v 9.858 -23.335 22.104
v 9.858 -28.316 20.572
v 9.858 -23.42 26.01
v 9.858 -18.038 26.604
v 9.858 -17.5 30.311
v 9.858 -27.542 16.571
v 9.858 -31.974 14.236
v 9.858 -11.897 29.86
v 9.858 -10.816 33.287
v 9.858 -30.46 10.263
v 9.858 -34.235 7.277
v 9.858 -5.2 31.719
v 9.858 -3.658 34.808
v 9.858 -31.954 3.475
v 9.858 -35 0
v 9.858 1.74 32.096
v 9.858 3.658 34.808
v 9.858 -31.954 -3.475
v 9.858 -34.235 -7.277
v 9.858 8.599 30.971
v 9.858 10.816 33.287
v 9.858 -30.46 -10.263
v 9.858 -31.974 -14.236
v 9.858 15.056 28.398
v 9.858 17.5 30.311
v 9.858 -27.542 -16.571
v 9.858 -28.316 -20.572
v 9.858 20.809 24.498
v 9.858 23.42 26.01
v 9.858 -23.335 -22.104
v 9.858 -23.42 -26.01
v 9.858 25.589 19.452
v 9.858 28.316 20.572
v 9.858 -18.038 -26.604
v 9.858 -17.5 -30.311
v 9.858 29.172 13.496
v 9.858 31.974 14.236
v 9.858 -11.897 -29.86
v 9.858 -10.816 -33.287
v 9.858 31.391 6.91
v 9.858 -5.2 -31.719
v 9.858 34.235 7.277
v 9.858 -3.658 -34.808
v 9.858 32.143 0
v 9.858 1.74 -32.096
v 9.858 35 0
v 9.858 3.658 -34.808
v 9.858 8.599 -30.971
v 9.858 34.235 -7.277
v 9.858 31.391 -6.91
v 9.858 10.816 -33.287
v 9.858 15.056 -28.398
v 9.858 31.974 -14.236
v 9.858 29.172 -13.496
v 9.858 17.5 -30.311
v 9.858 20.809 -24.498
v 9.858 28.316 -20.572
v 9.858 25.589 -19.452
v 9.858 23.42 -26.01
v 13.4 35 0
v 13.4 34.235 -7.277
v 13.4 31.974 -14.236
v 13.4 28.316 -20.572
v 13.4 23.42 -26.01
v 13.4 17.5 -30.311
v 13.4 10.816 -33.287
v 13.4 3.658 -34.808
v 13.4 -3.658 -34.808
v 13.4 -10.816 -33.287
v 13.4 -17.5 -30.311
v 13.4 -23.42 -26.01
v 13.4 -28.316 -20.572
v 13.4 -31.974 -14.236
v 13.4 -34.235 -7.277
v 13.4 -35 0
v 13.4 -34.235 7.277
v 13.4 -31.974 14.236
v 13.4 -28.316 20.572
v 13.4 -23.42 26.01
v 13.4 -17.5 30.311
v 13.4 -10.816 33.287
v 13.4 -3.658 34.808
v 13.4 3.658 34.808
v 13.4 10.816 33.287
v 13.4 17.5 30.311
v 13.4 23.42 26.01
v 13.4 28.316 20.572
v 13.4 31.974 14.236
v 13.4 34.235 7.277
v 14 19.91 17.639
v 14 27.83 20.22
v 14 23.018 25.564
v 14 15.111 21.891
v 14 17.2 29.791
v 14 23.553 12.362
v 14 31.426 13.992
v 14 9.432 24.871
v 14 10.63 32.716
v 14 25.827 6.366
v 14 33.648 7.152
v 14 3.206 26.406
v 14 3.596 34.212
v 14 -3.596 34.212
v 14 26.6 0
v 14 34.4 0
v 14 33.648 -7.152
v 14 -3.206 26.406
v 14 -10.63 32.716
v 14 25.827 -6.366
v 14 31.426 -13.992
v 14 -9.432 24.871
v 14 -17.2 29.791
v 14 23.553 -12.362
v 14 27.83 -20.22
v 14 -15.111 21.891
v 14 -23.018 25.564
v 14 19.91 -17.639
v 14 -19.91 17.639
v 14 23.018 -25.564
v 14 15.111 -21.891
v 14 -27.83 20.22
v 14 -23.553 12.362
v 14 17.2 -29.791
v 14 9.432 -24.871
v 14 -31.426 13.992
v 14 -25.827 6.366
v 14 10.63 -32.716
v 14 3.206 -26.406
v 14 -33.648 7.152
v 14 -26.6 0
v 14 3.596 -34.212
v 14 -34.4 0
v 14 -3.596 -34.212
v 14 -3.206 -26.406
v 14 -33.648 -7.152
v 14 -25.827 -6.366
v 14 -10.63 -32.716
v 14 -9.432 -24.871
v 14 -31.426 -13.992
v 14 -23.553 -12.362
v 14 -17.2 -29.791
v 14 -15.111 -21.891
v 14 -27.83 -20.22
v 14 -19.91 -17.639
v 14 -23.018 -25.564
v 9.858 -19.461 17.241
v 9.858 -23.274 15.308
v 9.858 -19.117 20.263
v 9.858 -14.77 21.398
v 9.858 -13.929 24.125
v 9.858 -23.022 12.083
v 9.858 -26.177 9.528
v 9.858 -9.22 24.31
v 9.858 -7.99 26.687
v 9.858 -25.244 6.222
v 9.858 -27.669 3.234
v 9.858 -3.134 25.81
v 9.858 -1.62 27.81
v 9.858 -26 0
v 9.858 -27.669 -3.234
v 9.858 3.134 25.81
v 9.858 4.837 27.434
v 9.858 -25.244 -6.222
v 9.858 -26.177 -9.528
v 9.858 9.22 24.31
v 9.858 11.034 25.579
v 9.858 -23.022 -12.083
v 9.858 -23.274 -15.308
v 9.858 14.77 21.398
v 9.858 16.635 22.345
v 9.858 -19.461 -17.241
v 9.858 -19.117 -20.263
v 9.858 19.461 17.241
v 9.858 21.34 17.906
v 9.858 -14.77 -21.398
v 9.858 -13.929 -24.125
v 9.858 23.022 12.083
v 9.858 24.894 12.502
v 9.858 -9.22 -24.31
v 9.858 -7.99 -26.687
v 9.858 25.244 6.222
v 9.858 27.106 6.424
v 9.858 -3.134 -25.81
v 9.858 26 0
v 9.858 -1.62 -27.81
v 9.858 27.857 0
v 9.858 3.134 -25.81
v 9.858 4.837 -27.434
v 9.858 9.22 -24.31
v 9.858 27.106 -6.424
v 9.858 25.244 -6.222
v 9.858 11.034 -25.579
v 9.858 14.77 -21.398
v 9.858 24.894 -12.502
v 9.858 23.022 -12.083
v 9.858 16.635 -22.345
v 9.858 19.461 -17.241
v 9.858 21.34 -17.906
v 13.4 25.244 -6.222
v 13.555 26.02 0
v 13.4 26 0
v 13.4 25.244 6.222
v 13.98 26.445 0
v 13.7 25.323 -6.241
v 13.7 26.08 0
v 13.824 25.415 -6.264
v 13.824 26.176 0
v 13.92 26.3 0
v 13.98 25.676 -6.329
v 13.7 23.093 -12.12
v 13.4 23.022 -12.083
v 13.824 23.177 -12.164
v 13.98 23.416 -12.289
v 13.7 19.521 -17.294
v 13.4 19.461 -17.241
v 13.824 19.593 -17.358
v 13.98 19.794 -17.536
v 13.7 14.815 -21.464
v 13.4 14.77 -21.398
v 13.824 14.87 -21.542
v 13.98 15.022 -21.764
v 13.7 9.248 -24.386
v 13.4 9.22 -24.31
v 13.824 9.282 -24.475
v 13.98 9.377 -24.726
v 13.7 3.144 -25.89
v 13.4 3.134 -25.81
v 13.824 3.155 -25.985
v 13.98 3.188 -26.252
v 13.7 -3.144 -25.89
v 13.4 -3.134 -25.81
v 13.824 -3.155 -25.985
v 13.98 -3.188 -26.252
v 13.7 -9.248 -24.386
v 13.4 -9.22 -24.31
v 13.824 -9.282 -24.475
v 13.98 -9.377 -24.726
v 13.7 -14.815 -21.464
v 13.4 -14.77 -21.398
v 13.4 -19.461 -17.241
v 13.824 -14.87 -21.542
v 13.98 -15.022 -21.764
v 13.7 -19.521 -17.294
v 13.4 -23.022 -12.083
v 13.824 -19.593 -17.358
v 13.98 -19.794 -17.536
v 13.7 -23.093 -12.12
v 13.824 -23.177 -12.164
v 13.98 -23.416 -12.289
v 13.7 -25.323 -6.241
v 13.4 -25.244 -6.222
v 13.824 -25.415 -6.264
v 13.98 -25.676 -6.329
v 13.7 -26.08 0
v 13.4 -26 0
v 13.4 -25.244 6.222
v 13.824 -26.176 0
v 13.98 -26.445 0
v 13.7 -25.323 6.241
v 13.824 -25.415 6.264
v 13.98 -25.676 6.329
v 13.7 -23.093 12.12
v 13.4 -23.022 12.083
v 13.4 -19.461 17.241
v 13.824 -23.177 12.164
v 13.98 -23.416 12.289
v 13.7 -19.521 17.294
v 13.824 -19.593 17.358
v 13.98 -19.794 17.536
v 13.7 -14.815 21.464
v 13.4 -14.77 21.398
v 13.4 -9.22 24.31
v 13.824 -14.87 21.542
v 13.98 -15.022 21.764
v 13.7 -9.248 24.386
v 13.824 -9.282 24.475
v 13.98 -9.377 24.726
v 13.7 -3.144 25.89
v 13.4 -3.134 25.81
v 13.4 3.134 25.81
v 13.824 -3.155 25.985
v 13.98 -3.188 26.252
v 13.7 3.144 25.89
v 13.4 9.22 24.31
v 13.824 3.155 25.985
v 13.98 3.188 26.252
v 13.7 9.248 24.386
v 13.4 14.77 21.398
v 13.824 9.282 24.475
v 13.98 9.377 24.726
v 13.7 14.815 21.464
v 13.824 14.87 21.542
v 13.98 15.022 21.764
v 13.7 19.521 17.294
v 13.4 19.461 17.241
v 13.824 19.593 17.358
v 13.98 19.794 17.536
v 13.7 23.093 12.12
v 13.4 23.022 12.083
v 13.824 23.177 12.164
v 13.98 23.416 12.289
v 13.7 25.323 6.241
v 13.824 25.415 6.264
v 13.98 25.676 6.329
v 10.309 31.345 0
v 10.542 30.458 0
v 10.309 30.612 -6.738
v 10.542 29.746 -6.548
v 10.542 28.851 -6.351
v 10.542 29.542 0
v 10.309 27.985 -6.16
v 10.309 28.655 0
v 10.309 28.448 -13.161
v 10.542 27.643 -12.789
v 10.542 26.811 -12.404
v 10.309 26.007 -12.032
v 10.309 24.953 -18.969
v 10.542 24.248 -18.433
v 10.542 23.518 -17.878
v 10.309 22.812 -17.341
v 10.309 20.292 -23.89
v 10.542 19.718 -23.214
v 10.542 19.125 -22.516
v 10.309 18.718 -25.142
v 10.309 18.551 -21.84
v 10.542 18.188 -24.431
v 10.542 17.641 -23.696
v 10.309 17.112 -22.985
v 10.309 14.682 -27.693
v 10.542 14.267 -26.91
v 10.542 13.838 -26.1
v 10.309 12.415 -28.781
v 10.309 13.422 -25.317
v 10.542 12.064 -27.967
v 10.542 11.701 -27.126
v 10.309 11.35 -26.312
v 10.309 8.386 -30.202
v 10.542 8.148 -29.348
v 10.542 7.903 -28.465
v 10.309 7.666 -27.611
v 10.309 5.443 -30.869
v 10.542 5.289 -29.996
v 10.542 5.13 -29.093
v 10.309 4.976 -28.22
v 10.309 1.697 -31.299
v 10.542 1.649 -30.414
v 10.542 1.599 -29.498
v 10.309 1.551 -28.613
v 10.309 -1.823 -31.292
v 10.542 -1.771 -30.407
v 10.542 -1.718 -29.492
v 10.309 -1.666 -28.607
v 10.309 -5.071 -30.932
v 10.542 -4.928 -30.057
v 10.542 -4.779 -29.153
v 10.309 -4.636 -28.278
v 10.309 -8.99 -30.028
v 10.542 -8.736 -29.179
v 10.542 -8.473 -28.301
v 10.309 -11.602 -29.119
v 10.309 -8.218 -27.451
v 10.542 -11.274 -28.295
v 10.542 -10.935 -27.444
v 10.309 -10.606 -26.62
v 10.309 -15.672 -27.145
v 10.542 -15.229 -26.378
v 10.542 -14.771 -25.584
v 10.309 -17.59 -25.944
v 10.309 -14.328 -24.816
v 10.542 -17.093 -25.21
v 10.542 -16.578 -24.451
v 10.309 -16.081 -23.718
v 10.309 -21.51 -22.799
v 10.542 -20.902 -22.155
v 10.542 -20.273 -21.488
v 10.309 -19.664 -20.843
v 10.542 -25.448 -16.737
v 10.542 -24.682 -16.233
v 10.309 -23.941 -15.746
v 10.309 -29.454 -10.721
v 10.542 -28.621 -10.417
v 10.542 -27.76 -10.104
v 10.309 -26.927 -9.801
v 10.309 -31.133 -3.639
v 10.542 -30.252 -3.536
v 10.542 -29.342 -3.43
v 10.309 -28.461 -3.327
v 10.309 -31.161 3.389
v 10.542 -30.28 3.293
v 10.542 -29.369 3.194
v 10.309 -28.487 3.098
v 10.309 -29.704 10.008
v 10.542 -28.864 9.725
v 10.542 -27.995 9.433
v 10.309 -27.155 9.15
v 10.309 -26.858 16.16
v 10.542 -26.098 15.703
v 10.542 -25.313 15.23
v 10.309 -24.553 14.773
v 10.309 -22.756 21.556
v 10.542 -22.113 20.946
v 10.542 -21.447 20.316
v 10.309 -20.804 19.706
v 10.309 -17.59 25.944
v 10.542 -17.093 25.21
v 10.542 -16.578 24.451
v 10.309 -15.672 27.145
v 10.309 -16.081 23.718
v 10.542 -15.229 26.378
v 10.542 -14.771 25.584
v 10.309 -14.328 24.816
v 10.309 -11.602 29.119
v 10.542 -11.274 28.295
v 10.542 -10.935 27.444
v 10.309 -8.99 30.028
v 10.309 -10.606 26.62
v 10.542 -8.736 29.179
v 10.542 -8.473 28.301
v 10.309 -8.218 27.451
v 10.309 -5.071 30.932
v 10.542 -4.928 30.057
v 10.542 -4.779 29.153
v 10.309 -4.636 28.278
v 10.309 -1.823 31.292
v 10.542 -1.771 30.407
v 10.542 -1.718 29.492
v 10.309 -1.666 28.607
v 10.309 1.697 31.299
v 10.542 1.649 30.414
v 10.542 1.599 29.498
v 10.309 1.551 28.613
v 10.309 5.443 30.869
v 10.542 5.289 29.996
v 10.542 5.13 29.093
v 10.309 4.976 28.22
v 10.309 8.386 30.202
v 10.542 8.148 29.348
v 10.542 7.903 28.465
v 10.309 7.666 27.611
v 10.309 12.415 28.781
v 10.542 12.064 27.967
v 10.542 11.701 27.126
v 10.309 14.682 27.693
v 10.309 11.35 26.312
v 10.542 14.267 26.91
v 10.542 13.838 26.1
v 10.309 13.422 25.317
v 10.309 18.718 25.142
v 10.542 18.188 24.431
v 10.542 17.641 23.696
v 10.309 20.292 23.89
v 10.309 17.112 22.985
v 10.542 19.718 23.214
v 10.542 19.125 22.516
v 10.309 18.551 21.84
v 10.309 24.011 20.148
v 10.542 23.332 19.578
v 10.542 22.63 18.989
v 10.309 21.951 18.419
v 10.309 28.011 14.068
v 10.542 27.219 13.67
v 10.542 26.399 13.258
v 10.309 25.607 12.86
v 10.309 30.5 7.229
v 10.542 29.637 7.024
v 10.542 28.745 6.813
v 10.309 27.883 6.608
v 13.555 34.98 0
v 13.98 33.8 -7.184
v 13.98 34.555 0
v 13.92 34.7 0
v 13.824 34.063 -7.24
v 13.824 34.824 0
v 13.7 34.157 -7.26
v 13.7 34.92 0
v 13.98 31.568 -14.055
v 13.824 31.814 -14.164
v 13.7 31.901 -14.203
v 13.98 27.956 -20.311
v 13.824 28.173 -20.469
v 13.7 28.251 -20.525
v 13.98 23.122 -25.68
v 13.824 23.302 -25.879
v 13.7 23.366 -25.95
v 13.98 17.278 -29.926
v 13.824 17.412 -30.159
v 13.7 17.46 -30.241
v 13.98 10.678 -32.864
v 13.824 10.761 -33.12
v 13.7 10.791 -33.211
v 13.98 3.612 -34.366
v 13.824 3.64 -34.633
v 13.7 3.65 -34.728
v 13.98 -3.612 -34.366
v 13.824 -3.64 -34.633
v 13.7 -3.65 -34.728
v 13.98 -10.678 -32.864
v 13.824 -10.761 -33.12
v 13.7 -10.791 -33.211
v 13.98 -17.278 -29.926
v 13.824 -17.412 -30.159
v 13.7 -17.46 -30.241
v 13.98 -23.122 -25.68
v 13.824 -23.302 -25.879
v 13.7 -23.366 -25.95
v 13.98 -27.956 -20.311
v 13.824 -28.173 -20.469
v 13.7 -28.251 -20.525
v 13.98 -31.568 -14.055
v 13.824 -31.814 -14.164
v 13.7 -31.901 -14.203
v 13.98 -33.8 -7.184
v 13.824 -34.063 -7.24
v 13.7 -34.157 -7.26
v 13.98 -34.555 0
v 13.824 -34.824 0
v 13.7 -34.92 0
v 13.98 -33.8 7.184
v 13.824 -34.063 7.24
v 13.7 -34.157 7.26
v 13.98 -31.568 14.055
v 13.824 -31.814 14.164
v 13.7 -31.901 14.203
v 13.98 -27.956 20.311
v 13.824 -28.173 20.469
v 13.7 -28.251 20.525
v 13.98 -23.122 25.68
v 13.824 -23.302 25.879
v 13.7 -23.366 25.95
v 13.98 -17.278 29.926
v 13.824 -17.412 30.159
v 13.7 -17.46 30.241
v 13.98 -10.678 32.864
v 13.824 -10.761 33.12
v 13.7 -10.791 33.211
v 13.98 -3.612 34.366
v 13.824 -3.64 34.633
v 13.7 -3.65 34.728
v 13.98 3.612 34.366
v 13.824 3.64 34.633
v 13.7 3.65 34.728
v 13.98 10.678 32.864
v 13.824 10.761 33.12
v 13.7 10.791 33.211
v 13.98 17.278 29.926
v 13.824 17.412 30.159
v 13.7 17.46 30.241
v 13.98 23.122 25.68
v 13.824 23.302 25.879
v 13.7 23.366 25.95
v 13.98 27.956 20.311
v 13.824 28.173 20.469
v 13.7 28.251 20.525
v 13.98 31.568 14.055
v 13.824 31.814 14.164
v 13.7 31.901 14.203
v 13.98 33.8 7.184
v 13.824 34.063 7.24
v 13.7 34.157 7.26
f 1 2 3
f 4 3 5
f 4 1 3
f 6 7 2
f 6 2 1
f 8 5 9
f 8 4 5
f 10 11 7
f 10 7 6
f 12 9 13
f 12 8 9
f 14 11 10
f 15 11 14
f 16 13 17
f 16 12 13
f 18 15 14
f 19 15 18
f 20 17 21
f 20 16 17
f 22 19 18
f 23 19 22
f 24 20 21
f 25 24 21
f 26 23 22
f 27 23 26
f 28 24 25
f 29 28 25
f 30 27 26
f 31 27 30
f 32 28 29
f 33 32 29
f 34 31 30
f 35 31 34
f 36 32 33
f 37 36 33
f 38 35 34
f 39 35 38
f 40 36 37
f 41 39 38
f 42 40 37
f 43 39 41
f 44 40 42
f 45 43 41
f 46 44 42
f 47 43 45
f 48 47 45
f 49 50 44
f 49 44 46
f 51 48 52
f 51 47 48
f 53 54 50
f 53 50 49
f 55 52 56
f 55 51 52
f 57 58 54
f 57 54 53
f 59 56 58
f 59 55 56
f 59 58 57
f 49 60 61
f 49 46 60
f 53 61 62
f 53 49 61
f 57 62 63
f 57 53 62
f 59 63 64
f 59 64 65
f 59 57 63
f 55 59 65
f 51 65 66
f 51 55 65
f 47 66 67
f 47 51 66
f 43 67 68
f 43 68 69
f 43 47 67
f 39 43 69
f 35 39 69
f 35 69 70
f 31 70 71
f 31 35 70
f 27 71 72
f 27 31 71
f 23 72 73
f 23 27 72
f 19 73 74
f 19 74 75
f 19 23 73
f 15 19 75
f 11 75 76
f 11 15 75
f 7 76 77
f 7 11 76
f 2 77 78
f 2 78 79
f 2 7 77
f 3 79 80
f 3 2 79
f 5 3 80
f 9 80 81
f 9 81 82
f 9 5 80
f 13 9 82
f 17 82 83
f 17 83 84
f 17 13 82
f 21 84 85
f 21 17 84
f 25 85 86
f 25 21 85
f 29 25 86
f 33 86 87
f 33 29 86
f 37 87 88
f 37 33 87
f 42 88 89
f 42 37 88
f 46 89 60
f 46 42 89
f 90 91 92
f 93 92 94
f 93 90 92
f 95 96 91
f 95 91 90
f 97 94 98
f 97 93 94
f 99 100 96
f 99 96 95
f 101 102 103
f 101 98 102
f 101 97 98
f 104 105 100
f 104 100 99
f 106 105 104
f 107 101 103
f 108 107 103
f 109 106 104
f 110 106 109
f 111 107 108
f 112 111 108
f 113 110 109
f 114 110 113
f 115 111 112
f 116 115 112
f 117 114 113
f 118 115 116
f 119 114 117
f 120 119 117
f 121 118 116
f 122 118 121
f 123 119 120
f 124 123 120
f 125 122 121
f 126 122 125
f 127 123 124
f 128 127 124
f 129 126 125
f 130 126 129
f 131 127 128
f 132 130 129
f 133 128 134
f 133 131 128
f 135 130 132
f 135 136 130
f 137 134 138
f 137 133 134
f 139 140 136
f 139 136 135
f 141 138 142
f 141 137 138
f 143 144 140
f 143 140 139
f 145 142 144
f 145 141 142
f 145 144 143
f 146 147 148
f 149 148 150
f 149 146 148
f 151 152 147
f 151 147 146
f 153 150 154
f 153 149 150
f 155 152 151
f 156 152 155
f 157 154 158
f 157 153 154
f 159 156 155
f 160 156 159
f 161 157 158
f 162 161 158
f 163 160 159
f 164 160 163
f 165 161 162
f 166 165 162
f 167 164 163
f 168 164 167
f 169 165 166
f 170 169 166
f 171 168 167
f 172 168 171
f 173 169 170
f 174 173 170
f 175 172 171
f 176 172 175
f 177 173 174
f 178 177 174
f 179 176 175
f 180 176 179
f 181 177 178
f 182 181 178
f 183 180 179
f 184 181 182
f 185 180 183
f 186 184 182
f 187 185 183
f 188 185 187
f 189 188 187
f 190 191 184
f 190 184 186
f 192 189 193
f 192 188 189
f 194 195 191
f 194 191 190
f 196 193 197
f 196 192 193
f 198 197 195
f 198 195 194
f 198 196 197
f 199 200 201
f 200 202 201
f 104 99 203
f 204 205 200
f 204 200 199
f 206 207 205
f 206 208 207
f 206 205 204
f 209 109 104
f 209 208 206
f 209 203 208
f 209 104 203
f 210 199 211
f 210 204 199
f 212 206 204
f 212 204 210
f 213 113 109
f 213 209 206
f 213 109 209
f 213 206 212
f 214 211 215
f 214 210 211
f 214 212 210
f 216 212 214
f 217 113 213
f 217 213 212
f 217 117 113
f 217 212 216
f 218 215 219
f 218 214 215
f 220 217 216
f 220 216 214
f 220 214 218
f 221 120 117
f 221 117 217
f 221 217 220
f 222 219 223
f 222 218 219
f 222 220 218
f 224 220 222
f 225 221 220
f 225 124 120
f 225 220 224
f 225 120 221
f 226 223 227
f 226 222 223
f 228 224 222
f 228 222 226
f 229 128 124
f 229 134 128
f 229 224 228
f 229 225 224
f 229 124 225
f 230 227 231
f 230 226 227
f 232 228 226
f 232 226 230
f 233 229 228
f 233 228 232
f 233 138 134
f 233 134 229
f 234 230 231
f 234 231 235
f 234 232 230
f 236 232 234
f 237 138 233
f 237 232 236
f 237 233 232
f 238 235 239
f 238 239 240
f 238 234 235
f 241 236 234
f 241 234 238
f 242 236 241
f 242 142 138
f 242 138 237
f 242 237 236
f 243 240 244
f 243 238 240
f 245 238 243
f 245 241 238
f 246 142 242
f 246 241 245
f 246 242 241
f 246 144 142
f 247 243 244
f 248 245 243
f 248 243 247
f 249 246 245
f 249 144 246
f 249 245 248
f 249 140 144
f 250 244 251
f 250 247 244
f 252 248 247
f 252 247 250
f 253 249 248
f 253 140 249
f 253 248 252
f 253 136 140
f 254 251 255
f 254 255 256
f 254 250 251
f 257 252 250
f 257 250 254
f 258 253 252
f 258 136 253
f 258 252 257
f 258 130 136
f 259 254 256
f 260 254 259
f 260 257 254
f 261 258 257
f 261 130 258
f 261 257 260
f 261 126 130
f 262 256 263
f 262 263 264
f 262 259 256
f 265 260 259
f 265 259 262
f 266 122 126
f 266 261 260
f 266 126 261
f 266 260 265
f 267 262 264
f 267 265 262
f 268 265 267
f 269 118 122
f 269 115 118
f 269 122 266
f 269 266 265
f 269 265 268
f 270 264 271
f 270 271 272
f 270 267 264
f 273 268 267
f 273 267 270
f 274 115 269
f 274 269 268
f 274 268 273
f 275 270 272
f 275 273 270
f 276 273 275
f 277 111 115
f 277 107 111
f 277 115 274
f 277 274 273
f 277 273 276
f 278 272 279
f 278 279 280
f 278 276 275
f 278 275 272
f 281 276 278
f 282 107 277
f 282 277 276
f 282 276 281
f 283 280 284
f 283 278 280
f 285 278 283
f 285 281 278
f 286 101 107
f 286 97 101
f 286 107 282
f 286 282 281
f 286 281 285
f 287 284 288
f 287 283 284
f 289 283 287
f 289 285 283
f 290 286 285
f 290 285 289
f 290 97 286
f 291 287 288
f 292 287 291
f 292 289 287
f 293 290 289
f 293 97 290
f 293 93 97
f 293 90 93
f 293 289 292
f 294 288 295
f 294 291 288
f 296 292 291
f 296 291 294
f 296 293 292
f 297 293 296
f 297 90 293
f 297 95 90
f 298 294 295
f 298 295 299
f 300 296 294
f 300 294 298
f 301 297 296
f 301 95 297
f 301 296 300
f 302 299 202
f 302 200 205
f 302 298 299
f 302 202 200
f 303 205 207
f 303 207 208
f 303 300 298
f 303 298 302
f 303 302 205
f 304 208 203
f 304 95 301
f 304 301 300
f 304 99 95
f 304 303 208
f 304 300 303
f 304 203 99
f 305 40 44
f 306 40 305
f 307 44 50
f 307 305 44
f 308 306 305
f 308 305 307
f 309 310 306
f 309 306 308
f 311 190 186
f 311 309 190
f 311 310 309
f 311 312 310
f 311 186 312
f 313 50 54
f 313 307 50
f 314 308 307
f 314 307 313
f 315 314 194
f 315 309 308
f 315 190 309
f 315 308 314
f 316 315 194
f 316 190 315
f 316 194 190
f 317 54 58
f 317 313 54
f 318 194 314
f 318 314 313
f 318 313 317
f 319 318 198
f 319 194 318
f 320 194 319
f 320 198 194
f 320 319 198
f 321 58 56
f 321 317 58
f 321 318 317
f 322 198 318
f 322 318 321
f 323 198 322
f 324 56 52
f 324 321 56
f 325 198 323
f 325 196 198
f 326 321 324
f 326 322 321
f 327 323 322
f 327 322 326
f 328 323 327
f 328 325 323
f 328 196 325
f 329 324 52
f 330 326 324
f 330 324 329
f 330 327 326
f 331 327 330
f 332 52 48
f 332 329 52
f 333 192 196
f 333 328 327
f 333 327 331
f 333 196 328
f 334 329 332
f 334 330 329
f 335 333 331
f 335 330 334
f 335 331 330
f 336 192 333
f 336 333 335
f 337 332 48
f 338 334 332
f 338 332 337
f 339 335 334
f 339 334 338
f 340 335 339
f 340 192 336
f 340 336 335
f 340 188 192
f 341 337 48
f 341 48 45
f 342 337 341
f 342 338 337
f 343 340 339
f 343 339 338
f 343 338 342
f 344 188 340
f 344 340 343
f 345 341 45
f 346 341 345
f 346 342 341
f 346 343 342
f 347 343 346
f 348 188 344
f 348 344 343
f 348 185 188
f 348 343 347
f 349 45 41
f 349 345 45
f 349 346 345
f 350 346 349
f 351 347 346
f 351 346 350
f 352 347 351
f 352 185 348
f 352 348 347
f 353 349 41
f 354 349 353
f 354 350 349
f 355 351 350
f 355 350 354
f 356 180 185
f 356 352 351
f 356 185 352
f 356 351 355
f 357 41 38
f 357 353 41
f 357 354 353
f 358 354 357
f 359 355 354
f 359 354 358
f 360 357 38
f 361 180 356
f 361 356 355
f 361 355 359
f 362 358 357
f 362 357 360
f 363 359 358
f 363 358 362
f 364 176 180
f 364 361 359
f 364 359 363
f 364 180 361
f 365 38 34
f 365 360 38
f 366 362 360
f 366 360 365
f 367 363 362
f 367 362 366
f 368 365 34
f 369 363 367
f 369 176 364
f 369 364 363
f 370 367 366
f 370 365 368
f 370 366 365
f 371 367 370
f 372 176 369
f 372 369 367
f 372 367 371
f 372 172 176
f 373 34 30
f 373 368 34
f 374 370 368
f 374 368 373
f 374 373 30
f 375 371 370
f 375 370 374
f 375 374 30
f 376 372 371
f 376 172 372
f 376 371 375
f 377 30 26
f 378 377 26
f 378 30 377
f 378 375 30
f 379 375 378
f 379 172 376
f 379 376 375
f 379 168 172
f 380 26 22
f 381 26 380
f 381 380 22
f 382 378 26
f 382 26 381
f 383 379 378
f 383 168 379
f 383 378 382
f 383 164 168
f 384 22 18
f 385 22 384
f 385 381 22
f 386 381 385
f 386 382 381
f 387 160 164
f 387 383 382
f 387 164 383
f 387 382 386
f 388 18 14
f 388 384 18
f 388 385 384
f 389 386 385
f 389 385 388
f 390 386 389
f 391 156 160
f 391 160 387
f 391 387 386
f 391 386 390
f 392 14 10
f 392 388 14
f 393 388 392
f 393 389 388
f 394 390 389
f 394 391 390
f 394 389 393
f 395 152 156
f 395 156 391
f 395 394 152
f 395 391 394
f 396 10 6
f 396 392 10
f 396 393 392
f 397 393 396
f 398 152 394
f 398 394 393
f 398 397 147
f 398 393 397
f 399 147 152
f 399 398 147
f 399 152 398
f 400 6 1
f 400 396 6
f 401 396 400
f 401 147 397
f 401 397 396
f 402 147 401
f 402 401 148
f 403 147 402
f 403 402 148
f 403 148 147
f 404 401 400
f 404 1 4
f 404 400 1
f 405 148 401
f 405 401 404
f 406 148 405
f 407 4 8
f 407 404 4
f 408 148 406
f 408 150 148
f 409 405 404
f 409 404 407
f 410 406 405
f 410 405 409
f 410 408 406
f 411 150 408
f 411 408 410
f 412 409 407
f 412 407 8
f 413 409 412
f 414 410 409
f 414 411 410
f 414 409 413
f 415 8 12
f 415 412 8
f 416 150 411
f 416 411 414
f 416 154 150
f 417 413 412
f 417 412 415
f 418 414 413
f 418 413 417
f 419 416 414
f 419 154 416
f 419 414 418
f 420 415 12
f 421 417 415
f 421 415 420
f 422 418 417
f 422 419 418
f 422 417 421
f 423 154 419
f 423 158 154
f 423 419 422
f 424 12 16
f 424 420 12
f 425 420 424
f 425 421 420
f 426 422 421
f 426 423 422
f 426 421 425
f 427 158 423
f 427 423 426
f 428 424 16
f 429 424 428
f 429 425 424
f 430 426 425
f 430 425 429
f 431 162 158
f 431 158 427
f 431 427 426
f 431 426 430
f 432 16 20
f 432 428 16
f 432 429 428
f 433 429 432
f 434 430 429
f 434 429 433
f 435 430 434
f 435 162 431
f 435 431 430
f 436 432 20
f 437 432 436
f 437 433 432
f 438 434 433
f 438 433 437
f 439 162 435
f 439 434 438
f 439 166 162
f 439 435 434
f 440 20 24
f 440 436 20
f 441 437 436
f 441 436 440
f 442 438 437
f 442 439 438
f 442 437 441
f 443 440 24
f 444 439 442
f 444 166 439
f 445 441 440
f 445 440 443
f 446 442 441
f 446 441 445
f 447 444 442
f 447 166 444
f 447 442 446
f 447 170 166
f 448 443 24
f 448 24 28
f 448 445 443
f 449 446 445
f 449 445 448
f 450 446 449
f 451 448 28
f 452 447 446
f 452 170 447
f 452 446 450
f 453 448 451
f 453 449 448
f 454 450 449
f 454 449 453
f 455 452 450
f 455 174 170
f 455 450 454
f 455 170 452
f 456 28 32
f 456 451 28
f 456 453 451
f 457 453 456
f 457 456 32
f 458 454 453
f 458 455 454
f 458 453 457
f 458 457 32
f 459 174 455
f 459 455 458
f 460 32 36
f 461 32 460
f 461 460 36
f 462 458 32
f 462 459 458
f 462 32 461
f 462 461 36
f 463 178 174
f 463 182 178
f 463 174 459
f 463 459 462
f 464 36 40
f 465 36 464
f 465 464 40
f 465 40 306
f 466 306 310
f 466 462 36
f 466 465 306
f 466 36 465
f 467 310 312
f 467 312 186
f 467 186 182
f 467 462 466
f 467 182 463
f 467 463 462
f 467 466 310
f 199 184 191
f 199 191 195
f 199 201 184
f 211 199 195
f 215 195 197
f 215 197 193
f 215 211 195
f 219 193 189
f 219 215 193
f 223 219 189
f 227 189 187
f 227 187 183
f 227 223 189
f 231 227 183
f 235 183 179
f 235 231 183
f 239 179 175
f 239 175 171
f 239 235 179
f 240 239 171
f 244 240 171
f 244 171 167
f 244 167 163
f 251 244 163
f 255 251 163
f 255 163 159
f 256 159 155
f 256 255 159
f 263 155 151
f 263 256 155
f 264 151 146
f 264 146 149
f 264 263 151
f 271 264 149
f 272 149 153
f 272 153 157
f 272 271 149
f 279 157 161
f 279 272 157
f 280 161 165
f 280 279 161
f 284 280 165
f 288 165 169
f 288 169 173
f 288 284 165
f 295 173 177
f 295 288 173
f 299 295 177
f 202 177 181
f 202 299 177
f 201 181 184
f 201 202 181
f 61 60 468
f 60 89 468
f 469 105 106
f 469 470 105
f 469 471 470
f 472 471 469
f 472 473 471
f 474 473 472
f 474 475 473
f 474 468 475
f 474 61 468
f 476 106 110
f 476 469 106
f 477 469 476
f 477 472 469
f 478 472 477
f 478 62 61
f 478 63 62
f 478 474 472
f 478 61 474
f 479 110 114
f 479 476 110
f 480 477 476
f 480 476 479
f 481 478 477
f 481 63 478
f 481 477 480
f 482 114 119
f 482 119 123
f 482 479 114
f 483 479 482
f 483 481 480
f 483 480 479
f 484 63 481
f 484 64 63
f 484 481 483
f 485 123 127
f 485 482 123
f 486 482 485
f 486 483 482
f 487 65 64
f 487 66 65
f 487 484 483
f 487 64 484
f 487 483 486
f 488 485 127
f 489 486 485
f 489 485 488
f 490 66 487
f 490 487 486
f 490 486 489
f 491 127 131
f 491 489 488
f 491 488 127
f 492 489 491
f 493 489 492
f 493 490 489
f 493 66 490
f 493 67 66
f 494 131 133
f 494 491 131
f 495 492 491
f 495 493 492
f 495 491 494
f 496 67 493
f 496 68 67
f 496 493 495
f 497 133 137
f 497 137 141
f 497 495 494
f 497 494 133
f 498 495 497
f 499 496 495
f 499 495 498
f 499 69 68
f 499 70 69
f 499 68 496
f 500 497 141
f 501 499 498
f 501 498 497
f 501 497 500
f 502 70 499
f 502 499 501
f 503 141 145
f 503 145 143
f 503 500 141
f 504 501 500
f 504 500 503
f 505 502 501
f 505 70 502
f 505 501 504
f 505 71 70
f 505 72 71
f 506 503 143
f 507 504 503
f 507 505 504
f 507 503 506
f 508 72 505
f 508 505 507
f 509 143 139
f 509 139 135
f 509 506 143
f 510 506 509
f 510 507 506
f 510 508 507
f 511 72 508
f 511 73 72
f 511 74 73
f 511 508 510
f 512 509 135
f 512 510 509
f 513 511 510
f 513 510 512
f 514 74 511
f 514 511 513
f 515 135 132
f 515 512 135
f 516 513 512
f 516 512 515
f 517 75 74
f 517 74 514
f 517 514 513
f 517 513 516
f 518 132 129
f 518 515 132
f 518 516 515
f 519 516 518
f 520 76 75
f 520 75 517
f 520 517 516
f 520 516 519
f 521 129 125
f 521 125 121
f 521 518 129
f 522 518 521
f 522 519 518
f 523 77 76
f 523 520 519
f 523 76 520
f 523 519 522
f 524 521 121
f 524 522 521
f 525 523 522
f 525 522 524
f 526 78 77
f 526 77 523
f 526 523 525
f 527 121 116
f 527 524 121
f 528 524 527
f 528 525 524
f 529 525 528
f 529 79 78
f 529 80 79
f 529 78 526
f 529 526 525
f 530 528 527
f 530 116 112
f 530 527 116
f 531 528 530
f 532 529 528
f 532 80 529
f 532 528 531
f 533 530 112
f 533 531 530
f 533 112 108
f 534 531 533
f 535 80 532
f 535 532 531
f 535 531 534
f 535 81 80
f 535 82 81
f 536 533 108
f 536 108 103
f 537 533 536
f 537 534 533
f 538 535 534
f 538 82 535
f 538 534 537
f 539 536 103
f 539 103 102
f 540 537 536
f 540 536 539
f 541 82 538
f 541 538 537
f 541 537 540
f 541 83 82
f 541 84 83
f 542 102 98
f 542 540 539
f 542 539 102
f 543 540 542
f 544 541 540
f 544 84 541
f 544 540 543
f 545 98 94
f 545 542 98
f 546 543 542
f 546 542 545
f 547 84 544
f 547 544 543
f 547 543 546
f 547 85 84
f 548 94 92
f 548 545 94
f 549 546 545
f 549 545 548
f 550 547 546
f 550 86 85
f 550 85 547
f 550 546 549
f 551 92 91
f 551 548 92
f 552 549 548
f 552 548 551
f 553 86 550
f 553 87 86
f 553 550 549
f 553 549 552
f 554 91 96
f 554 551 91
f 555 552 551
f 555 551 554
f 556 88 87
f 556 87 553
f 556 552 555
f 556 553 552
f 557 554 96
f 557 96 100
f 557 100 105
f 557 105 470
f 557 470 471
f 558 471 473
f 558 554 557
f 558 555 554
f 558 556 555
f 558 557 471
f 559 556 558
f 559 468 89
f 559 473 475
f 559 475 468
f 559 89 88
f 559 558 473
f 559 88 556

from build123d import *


with BuildPart() as part:
    # Croquis1 → Revolución1 (revolve)
    with BuildSketch(Plane.XY):
        with BuildLine():
            Line((9.858, 26), (13.4, 26))
            ThreePointArc((13.4, 26), (13.824264069, 26.175735931), (14, 26.6))
            Line((14, 26.6), (14, 34.4))
            ThreePointArc((14, 34.4), (13.824264069, 34.824264069), (13.4, 35))
            Line((13.4, 35), (9.858, 35))
            Line((9.858, 35), (9.858, 32.142666563))
            ThreePointArc((9.858, 32.142666563), (10.572, 30), (9.858, 27.857333437))
            Line((9.858, 27.857333437), (9.858, 26))
        make_face()
    revolve(axis=Axis((13.4, 0, 0), (-1, 0, 0)))


solid = part.part
